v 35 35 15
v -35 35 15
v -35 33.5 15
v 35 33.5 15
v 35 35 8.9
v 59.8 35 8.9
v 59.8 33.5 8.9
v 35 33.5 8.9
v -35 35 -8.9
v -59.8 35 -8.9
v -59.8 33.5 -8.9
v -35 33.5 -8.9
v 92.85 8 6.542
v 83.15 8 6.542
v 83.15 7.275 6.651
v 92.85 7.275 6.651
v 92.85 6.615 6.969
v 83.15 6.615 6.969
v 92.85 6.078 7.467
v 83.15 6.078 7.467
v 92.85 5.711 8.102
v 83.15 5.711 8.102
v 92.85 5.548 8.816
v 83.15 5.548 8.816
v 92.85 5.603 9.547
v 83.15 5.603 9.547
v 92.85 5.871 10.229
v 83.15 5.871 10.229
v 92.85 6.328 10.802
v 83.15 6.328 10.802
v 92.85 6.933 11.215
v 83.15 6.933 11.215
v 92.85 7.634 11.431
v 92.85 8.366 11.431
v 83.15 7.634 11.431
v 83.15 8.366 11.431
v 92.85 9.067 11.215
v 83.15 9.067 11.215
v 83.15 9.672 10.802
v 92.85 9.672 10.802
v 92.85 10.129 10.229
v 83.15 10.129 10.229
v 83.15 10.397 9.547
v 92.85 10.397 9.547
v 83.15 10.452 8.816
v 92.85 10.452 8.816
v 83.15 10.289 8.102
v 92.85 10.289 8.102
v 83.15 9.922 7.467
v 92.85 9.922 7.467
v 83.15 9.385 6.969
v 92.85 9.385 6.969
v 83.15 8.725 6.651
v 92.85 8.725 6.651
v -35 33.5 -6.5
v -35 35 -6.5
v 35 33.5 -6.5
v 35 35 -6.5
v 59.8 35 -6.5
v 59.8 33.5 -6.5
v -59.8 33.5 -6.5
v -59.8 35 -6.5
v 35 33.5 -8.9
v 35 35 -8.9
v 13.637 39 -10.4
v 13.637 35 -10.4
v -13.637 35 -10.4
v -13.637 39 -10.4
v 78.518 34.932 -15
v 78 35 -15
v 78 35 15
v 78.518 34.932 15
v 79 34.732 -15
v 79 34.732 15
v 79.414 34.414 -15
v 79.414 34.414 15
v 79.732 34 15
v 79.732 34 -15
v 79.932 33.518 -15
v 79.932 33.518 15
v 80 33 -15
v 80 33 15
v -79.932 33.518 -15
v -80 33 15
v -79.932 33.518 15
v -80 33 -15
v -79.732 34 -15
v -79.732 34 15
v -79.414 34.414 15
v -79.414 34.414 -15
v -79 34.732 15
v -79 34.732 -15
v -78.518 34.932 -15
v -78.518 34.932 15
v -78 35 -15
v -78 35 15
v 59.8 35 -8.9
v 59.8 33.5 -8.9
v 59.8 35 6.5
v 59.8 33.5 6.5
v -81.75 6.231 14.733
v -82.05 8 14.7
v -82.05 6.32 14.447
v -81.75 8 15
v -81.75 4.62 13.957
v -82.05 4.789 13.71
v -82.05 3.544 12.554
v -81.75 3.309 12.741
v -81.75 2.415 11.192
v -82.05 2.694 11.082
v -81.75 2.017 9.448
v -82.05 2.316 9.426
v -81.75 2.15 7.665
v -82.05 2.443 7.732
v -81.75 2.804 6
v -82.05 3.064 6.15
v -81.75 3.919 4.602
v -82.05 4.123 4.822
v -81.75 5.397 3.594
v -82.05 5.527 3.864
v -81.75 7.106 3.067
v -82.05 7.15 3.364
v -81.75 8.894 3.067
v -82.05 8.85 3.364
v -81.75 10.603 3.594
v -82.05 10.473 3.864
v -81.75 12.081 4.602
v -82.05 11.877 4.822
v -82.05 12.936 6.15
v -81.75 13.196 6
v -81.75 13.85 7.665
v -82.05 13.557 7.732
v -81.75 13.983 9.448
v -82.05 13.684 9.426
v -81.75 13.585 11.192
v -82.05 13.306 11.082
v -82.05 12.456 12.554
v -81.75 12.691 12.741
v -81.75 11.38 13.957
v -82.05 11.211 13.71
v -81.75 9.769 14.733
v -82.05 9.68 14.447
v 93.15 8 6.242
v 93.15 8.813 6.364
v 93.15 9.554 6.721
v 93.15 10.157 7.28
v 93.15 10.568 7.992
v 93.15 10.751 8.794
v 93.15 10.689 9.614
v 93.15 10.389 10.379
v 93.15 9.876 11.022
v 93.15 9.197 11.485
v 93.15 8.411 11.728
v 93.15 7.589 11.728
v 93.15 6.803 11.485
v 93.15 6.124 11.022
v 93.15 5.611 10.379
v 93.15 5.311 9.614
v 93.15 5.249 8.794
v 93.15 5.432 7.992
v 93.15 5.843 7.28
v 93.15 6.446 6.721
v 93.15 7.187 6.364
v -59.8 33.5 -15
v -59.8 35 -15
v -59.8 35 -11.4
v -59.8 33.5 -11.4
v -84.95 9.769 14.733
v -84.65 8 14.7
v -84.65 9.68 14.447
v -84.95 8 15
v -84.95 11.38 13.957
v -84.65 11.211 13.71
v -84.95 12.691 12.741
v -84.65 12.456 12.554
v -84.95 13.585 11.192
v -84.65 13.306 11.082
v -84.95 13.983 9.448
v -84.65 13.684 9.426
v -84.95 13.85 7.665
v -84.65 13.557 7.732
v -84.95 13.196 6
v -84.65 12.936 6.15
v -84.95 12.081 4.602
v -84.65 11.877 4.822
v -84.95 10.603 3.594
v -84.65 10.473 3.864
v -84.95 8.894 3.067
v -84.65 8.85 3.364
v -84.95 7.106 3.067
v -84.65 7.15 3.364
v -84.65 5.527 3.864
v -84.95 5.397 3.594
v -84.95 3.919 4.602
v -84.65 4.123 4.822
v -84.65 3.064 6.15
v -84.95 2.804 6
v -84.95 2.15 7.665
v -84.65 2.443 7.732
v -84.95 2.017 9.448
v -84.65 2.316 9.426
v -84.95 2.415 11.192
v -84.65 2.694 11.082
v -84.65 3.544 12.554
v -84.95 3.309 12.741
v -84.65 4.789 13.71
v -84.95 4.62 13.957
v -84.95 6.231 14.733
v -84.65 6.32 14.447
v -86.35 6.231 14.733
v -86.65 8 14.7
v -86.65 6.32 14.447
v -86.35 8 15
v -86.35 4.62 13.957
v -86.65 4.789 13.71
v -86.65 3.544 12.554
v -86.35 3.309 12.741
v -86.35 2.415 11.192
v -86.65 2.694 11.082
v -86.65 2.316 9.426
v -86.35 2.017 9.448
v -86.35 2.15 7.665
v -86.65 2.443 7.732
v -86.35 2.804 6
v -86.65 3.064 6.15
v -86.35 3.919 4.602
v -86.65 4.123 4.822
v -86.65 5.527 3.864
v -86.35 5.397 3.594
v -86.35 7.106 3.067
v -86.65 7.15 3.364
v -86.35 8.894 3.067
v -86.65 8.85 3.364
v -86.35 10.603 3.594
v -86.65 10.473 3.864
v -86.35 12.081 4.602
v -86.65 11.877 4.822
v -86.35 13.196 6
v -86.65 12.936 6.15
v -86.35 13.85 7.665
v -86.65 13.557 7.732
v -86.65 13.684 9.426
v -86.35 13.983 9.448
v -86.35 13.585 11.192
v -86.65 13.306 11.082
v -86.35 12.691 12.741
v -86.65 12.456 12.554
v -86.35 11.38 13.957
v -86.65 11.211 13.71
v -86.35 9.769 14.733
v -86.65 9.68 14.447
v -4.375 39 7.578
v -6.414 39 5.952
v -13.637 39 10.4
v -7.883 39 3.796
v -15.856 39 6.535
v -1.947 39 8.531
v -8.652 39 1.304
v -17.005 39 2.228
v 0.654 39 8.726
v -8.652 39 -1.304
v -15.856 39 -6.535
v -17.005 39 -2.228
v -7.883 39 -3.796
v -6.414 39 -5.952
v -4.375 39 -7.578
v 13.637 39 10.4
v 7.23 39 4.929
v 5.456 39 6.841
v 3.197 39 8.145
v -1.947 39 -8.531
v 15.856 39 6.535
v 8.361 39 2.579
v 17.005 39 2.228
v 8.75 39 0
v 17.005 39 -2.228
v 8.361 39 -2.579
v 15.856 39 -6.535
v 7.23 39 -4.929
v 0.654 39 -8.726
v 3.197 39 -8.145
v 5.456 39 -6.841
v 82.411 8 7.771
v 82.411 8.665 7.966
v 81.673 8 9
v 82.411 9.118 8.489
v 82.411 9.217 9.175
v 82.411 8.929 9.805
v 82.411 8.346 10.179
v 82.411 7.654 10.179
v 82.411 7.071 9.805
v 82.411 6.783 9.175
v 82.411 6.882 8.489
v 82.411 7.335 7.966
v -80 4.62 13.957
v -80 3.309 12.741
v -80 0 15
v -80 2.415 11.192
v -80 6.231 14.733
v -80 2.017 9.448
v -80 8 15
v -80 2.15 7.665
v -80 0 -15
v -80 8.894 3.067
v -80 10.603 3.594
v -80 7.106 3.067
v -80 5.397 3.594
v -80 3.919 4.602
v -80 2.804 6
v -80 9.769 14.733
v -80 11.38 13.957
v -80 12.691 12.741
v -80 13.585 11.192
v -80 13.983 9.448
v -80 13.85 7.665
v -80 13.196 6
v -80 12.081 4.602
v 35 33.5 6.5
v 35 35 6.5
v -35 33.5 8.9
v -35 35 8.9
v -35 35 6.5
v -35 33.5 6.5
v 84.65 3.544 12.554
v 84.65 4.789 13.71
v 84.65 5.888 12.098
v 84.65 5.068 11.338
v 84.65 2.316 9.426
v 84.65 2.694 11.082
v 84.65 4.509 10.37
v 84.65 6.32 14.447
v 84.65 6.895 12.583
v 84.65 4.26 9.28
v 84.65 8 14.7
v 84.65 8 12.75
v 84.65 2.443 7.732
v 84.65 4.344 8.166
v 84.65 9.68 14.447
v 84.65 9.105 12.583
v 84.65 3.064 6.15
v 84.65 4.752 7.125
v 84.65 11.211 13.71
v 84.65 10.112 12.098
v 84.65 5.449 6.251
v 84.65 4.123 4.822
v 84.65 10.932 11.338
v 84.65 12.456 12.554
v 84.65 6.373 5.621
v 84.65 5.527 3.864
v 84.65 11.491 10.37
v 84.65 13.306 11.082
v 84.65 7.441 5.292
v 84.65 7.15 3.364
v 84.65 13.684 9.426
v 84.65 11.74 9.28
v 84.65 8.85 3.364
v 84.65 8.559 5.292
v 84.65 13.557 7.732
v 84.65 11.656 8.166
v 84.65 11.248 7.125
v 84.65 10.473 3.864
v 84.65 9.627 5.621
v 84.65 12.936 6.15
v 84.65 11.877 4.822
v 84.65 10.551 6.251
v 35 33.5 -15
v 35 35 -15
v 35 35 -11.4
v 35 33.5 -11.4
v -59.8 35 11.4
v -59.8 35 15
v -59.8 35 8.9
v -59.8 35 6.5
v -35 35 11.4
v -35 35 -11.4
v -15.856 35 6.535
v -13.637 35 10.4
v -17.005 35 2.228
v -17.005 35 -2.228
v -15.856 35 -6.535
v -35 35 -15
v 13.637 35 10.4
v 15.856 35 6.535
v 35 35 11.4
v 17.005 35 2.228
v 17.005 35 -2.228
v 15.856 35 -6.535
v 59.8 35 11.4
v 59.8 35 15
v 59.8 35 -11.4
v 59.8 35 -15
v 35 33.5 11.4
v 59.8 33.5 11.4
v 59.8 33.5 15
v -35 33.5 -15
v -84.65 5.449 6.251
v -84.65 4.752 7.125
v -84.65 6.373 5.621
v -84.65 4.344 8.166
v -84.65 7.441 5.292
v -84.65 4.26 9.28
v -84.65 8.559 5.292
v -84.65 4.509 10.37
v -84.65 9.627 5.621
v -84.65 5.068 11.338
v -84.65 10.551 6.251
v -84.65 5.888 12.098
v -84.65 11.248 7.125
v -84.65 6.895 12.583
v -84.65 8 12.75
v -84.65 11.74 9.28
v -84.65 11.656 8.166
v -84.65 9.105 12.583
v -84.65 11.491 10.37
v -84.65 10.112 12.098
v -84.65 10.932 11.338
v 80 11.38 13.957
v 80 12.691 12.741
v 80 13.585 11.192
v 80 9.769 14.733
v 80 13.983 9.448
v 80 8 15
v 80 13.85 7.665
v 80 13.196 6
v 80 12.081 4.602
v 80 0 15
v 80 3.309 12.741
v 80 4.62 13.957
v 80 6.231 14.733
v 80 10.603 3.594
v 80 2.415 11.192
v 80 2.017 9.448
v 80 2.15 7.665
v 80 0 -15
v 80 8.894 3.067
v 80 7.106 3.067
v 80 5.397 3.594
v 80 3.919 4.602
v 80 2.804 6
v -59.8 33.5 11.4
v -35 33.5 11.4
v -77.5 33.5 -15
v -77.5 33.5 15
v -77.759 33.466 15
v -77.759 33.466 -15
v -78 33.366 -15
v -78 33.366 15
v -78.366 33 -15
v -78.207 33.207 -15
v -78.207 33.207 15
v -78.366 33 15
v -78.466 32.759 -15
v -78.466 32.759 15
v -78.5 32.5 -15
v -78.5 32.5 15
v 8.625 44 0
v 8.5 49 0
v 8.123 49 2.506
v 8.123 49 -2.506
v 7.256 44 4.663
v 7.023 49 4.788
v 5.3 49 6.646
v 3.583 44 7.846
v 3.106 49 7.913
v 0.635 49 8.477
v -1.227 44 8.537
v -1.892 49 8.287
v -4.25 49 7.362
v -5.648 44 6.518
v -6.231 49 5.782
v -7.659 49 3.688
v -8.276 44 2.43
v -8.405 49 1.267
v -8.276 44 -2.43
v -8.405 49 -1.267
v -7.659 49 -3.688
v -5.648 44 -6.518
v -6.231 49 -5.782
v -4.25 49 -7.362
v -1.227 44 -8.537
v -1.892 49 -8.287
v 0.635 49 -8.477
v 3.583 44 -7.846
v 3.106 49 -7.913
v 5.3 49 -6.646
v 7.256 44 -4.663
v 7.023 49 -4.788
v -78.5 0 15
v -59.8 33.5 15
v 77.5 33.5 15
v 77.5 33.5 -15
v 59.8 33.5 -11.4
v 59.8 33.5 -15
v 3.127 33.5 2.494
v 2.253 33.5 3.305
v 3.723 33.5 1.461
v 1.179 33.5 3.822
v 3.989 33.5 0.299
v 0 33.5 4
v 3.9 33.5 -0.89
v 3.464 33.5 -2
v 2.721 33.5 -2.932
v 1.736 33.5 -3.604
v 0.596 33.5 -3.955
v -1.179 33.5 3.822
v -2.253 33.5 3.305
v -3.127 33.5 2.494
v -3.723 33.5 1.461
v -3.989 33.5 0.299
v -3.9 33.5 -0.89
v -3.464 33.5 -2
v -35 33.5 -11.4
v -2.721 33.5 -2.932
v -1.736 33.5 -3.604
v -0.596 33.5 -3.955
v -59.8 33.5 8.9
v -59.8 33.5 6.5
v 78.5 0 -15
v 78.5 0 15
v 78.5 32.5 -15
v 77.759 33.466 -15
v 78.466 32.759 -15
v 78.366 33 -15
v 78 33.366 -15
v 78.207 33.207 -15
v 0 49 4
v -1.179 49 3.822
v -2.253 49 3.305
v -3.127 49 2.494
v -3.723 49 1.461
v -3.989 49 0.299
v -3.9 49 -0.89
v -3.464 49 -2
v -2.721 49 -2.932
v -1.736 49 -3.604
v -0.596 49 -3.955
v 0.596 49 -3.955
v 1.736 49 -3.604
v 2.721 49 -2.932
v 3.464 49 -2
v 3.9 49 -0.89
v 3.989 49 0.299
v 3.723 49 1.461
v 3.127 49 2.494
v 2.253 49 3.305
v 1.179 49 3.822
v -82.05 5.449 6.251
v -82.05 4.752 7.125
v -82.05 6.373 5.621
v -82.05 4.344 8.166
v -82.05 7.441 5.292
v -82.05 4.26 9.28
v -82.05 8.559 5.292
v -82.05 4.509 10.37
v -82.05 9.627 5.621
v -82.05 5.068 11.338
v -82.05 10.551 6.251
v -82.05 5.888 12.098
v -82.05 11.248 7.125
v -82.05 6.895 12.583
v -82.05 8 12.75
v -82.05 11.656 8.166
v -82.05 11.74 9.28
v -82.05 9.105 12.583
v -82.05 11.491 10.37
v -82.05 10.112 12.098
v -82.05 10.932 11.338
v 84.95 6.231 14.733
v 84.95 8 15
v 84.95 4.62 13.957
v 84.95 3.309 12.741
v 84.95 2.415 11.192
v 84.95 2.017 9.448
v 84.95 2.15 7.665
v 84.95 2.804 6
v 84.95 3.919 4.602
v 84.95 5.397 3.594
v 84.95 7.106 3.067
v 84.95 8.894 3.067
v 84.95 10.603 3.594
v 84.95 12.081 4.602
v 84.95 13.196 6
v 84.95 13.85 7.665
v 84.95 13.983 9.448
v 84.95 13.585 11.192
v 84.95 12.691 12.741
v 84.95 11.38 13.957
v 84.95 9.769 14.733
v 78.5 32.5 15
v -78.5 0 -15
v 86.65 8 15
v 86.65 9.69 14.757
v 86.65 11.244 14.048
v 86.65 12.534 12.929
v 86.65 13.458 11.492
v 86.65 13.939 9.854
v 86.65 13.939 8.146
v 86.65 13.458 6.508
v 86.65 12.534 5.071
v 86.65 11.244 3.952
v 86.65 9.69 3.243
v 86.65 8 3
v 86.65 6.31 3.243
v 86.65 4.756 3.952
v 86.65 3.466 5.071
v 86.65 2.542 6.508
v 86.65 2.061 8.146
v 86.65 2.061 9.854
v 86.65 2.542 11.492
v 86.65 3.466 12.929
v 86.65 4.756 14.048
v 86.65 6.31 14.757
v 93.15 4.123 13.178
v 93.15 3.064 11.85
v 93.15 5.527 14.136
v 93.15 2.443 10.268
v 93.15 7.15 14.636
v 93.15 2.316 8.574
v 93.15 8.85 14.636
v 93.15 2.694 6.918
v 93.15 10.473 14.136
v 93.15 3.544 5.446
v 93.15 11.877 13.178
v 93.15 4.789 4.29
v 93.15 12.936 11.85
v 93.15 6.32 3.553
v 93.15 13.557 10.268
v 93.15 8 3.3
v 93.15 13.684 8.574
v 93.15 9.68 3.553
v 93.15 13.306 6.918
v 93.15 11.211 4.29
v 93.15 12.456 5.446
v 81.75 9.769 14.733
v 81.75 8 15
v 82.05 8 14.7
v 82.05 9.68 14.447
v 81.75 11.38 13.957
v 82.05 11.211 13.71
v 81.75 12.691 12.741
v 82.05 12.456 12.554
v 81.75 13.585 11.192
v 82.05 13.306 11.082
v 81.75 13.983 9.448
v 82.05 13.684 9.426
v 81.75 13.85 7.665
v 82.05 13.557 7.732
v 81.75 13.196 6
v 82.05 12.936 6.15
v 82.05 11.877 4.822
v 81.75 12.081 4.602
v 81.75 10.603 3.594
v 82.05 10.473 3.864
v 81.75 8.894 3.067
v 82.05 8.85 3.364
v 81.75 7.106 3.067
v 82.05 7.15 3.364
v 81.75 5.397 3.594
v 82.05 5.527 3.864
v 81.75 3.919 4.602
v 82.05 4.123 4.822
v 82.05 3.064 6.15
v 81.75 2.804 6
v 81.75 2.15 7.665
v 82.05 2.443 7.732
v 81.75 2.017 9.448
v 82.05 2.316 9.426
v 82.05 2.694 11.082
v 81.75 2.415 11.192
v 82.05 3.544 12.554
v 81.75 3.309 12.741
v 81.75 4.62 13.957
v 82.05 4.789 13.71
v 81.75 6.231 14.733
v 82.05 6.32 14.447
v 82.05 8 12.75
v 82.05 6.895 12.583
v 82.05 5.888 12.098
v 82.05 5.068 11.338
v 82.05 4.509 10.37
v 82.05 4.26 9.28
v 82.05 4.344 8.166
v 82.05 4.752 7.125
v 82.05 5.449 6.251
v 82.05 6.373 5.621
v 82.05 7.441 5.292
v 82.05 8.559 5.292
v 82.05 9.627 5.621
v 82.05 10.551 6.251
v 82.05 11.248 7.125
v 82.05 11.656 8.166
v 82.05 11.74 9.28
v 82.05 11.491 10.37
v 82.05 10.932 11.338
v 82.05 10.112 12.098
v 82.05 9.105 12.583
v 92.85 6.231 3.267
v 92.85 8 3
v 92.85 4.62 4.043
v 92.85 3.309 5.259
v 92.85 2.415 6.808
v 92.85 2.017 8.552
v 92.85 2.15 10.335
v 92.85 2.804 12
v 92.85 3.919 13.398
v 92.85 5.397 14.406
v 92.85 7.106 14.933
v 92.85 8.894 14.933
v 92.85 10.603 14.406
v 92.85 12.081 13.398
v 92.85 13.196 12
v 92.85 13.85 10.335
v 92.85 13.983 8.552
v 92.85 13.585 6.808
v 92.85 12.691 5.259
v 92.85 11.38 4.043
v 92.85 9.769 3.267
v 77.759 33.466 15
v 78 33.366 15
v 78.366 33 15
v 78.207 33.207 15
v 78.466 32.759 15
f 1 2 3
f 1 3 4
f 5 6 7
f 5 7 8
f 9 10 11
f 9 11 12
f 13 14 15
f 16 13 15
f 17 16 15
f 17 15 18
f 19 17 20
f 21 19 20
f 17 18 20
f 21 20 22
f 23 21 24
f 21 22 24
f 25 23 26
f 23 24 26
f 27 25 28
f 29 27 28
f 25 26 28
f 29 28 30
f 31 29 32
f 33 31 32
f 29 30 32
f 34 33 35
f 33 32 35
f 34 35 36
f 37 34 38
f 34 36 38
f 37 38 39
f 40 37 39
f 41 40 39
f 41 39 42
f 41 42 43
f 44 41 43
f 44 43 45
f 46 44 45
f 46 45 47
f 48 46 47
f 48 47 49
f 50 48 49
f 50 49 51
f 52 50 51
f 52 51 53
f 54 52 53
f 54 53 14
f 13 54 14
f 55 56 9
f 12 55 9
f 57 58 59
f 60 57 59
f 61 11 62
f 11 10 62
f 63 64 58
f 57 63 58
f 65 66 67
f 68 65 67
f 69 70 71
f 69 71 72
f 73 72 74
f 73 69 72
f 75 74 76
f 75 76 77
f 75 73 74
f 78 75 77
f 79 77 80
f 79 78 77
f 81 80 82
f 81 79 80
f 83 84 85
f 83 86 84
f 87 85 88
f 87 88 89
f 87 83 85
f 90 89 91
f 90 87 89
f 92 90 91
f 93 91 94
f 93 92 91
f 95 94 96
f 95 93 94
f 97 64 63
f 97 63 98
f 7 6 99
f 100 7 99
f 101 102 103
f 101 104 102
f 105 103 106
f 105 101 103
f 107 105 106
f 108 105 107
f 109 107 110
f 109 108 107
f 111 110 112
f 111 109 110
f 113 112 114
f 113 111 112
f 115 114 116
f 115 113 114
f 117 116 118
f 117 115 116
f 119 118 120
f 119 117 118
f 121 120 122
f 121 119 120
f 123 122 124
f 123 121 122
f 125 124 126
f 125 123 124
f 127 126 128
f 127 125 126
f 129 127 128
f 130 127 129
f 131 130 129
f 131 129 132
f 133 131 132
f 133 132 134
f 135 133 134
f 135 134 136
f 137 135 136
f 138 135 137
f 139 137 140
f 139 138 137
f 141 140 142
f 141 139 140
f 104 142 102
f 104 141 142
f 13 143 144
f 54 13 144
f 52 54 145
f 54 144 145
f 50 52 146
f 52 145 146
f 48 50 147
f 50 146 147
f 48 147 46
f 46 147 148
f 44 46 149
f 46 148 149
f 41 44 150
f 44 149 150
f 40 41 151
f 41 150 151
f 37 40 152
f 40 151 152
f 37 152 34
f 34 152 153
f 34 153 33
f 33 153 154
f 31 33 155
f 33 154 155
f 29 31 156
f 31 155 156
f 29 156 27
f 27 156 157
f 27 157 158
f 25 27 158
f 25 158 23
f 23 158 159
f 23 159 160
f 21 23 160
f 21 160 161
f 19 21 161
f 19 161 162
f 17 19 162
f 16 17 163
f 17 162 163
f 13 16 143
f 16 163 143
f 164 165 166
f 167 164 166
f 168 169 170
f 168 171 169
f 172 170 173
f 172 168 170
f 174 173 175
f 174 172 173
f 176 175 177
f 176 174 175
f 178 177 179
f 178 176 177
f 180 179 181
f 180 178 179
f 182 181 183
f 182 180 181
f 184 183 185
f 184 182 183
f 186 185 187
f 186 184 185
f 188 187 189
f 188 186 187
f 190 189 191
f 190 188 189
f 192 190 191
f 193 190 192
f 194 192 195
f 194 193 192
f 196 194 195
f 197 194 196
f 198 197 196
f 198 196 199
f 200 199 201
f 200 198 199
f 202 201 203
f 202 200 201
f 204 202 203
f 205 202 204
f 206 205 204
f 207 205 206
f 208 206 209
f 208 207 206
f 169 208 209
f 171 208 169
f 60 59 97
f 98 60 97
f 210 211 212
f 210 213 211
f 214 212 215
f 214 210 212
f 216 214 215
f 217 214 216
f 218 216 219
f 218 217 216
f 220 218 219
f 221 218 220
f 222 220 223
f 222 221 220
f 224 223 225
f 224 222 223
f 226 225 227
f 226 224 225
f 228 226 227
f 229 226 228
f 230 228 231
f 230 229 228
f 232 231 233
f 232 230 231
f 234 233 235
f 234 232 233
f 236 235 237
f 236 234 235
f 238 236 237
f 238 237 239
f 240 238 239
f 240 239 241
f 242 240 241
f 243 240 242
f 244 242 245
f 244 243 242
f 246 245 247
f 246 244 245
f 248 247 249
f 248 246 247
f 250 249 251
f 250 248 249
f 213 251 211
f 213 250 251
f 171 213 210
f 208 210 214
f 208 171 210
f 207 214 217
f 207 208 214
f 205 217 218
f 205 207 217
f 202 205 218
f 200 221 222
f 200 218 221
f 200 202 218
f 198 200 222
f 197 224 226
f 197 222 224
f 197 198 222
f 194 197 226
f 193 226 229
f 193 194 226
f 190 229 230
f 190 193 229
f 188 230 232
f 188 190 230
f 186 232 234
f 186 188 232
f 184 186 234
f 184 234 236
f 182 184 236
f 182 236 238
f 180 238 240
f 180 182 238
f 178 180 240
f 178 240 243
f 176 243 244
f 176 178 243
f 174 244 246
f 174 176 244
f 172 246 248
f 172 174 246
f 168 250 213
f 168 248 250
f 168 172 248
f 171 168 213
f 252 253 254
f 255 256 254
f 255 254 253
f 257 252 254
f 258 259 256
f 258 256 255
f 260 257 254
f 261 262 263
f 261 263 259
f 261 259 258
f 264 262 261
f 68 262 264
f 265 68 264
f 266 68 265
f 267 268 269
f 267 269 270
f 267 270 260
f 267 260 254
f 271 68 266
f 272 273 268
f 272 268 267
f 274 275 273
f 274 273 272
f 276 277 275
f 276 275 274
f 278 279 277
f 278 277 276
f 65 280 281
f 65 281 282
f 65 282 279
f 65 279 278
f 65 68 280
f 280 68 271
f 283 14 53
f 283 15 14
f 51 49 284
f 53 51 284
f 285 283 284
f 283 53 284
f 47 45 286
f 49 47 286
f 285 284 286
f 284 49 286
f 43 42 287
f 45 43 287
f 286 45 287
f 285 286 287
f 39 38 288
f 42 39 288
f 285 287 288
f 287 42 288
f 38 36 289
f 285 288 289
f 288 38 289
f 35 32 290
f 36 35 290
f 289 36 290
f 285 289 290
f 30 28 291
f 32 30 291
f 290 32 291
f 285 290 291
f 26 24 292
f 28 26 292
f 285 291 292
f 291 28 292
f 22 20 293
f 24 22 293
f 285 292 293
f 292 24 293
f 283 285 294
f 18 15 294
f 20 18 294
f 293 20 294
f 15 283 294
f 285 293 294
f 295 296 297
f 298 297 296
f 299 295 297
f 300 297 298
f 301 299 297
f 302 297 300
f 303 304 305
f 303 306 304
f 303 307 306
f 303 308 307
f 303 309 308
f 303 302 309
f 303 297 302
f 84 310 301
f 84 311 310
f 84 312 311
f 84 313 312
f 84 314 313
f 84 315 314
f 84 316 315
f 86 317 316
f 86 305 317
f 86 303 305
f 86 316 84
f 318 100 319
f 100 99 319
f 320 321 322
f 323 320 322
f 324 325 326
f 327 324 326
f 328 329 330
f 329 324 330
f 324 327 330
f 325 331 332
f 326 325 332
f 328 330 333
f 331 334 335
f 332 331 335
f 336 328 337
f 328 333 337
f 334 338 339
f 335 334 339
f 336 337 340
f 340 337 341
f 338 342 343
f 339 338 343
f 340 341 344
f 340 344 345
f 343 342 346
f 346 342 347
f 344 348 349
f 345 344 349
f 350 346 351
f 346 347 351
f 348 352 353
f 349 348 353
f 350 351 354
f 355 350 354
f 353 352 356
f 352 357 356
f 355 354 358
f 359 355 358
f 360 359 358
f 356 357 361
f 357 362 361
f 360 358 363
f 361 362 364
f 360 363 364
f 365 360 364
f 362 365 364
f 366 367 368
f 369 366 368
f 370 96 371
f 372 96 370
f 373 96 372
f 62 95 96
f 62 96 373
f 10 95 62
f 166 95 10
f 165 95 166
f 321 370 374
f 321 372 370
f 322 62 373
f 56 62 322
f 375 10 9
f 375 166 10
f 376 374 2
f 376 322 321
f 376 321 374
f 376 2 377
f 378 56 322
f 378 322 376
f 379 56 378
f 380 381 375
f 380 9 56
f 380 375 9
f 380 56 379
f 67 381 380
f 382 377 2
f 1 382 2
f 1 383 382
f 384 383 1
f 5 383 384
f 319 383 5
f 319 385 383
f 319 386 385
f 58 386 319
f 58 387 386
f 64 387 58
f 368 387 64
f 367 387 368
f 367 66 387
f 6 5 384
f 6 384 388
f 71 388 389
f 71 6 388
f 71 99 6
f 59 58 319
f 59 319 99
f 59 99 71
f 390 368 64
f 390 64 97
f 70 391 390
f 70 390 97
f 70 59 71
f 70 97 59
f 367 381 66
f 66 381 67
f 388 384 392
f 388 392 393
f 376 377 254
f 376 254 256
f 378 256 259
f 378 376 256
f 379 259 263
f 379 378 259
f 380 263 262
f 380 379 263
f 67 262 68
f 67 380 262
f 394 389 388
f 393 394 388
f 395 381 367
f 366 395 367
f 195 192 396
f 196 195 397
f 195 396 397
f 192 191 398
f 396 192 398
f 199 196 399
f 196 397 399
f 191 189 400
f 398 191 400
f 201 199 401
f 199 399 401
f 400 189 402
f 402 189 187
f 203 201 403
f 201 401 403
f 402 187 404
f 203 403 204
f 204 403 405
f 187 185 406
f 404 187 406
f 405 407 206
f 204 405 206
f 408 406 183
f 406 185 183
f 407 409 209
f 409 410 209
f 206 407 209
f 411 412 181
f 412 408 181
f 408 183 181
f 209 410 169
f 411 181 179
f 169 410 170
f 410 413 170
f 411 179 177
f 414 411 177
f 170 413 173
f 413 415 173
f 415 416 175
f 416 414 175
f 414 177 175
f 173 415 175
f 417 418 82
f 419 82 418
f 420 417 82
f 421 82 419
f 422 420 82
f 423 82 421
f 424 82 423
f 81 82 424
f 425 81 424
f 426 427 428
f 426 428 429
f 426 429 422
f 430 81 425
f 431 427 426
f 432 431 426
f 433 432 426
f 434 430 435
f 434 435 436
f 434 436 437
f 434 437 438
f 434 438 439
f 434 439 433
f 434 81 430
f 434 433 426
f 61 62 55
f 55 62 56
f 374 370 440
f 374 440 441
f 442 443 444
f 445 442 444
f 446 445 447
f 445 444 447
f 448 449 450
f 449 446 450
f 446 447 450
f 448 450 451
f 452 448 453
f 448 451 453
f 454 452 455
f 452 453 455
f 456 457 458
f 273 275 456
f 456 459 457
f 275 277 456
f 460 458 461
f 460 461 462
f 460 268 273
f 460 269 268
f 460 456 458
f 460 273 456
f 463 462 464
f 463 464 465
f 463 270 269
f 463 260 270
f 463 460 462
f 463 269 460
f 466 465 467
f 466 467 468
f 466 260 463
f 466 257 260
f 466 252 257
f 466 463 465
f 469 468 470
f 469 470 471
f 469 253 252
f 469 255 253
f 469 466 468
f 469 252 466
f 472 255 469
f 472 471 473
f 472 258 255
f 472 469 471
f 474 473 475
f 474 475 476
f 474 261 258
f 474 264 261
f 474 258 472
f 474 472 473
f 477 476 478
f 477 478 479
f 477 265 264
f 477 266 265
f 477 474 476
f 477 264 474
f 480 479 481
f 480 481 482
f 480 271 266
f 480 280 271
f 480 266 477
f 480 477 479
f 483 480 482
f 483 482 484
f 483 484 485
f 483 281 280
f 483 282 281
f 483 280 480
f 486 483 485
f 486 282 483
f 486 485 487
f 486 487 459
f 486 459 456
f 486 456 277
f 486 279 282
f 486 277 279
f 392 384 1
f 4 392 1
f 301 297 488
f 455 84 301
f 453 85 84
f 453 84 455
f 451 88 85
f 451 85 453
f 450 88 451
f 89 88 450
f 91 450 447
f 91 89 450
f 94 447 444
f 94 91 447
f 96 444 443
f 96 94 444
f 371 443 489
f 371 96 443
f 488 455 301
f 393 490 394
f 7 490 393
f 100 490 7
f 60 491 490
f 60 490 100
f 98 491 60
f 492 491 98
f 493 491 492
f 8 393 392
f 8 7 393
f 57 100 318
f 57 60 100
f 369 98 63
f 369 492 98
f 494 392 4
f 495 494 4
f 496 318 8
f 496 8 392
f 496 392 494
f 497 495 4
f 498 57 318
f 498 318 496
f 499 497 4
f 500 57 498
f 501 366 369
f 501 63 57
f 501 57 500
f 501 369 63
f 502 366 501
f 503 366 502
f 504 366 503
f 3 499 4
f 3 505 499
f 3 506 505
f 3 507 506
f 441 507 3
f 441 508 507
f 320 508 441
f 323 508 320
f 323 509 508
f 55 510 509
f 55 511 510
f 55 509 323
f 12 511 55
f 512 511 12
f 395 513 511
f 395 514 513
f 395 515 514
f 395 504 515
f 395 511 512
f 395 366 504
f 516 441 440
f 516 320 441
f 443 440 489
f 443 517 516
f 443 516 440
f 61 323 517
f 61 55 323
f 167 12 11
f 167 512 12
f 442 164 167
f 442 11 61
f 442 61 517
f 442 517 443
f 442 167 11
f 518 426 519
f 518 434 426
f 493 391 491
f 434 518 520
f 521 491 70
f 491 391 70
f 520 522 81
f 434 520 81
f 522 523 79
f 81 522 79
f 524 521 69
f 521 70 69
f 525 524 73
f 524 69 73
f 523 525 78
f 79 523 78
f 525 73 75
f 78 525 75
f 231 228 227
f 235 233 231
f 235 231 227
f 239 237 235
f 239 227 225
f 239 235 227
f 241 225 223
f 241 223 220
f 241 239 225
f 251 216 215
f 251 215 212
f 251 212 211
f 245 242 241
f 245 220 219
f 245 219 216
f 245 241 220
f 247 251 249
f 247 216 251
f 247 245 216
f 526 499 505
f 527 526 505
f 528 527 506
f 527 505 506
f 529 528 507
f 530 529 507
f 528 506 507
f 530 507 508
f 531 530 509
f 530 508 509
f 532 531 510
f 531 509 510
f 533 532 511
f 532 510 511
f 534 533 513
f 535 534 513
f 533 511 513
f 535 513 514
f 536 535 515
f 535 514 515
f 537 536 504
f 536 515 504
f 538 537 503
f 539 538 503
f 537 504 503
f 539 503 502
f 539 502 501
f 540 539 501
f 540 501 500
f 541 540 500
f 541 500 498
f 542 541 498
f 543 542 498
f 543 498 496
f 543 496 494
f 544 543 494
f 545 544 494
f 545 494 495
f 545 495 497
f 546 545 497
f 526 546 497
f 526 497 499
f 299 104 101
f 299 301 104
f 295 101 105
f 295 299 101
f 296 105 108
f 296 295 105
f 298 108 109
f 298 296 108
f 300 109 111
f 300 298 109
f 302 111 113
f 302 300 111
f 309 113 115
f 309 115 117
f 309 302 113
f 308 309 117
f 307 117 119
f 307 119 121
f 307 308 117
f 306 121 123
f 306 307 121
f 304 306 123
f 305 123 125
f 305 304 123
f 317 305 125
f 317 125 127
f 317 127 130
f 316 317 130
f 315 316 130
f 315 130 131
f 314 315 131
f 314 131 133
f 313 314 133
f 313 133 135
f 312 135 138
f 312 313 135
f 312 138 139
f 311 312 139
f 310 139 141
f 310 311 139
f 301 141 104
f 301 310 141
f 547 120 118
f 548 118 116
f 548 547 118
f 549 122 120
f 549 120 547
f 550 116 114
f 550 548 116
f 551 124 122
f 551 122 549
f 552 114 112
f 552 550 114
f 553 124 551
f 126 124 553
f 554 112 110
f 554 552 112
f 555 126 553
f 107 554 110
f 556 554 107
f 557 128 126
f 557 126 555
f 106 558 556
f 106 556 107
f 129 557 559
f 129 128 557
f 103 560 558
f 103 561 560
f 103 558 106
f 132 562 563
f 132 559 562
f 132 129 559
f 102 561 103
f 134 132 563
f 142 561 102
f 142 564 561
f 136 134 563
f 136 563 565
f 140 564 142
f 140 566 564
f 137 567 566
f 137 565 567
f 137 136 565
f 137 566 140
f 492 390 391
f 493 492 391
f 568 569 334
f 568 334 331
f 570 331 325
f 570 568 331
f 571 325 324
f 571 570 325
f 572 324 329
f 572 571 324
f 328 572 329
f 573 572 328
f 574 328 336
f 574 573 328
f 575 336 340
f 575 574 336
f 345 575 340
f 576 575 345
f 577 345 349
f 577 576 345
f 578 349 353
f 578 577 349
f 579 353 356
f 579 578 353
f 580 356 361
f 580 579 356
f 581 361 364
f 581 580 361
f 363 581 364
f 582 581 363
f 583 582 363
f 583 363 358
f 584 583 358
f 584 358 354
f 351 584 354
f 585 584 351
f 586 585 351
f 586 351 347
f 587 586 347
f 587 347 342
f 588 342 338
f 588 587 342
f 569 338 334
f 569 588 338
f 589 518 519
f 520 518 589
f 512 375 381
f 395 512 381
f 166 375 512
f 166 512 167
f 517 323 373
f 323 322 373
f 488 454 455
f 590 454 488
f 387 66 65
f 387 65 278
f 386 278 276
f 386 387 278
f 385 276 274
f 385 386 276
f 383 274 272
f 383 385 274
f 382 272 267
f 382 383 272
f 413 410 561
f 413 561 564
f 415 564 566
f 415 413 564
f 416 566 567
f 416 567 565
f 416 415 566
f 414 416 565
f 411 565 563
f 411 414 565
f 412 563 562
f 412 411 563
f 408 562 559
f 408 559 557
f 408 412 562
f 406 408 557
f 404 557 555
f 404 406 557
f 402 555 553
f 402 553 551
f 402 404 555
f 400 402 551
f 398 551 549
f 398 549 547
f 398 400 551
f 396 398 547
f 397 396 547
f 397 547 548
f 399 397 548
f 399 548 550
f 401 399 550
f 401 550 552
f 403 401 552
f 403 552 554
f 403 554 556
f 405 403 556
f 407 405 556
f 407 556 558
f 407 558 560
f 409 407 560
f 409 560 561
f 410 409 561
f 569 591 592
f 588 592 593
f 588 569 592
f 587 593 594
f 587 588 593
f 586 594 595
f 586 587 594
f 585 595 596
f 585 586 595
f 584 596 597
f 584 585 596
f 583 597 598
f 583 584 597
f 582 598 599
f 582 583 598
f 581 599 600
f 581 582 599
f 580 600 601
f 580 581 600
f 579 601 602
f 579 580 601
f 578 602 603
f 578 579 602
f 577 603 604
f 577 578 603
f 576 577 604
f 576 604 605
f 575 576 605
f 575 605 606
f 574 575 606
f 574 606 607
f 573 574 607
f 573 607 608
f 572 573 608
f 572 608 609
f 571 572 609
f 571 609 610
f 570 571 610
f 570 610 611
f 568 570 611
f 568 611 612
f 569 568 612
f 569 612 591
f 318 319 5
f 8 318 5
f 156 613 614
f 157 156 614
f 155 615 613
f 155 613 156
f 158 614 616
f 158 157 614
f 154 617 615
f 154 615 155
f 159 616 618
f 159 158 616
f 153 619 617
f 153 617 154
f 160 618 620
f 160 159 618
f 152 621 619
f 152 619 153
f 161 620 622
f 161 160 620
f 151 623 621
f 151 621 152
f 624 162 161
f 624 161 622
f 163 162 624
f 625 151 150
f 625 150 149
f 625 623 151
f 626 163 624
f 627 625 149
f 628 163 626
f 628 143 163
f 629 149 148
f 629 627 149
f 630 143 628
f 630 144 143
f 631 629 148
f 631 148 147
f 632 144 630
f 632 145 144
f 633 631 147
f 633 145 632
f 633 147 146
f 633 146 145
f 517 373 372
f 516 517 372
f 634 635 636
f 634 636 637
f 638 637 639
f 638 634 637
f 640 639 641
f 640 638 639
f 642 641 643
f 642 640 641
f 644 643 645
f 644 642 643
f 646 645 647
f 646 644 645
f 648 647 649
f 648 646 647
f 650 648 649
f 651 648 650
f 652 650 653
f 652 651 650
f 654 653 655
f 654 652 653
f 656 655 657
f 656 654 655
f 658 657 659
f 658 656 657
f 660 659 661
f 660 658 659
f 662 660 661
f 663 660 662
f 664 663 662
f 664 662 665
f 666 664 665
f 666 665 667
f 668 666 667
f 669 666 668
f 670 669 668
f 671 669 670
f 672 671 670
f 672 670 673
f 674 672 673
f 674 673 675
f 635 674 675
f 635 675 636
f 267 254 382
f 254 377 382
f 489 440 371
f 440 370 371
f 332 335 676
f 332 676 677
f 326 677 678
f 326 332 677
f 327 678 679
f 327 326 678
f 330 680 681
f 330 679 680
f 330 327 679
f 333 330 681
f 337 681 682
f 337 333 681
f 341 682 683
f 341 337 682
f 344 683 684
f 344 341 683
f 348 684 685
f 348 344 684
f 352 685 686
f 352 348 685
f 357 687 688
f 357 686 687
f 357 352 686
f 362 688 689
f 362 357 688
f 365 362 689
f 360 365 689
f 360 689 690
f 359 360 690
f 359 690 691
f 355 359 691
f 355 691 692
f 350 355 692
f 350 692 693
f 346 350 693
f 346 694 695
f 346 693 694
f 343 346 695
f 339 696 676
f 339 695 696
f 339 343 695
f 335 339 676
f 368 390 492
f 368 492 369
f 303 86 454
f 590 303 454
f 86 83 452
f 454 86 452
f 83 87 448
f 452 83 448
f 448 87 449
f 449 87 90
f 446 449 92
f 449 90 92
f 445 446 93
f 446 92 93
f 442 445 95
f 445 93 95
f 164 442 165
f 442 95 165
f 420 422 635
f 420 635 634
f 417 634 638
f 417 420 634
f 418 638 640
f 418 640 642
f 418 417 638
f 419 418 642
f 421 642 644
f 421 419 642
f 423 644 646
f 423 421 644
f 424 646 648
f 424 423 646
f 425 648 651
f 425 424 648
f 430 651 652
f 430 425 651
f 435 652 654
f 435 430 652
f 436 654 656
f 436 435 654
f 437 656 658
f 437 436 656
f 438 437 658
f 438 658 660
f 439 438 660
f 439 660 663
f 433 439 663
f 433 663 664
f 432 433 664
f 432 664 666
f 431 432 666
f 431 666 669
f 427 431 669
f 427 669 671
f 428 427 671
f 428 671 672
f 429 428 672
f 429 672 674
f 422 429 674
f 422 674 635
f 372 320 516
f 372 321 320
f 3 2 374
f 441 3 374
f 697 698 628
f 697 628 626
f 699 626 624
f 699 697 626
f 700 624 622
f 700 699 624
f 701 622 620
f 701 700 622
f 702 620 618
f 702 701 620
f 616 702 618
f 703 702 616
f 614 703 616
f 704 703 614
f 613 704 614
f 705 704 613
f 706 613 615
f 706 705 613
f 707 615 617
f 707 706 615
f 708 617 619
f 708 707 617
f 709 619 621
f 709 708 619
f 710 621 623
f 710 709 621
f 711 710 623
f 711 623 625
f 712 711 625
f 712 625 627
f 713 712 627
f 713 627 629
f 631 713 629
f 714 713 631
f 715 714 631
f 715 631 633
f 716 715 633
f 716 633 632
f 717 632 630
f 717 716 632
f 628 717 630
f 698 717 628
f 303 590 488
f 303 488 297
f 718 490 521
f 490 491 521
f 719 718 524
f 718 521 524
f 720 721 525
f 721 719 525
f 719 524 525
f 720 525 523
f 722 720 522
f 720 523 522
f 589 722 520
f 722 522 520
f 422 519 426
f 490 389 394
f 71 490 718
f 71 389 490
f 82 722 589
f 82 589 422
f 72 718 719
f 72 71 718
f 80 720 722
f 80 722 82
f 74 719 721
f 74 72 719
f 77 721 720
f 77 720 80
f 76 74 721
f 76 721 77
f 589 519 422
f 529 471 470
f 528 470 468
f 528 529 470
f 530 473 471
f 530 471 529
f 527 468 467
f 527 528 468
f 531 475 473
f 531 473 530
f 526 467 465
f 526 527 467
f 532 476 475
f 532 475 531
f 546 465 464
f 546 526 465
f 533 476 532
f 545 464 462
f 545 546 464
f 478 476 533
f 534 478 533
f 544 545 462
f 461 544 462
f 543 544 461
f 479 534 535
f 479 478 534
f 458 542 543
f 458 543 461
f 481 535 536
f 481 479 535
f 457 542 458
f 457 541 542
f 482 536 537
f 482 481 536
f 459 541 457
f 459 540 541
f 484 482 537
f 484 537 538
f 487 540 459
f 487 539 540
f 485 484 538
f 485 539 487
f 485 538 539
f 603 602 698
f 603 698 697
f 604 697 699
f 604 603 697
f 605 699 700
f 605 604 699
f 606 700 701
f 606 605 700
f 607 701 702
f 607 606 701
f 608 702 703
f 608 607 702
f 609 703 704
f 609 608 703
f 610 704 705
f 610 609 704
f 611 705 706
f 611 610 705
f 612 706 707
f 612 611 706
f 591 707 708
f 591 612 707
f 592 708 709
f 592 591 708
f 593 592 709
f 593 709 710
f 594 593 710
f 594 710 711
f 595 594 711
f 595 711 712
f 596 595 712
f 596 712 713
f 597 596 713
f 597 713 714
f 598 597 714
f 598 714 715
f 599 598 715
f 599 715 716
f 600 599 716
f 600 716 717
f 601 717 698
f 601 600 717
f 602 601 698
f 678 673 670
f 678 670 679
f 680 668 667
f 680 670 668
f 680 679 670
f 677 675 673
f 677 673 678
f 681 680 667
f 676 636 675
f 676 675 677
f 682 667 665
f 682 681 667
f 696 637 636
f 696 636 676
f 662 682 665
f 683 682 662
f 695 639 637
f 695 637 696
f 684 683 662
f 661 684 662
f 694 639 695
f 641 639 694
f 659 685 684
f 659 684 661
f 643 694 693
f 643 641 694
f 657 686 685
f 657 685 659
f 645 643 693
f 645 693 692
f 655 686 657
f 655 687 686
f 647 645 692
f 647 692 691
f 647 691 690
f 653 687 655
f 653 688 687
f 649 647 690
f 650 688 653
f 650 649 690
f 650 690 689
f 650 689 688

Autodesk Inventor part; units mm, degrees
sketch "Esquisse1" plane through (0, 0, 0) normal (0, 0, 1) x (1, 0, 0)
  line L0 (-80, 0) -> (-80, 35)
  line L1 (-80, 35) -> (80, 35)
  line L2 (80, 35) -> (80, 0)
  line L3 (80, 0) -> (78.5, 0)
  line L4 (78.5, 0) -> (78.5, 33.5)
  line L5 (78.5, 33.5) -> (-78.5, 33.5)
  line L6 (-78.5, 33.5) -> (-78.5, 0)
  line L7 (-78.5, 0) -> (-80, 0)
  point P0 (0, 0)
  point P1 (-79.25, 0)
  point P2 (0, 35)
  point P3 (0, 33.5)
  dimension "d0" = 1.5
  dimension "d1" = 1.5
  dimension "d2" = 160
  dimension "d3" = 35
extrude "Extrusion1" add sketch "Esquisse1" along normal mid plane 30
fillet "Congé1" radius 2 2 edges at (80, 35, 0) (-80, 35, 0)
fillet "Congé1" radius 1 2 edges at (-78.5, 33.5, 0) (78.5, 33.5, 0)
sketch "Esquisse2" plane through (-78, 35, 15) normal (0, 1, 0) x (1, 0, 0)
  line L0 (64.3632, 4.6) -> (91.6368, 4.6)
  line L1 (91.6368, 25.4) -> (64.3632, 25.4)
  arc A0 (64.3632, 25.4) -> (64.3632, 4.6) centre (78, 15) ccw
  arc A1 (91.6368, 4.6) -> (91.6368, 25.4) centre (78, 15) ccw
  point P0 (102.0926, 15)
  dimension "d9" = 20.8
  dimension "d10" = 17.15
  dimension "d11" = 17.15
  dimension "d12" = 10.4
extrude "Extrusion2" add sketch "Esquisse2" along normal blind 4
sketch "Esquisse3" plane through (-78, 39, 15) normal (0, 1, 0) x (1, 0, 0)
  circle A0 centre (78, 15) radius 8.75
  dimension "d15" = 17.5
extrude "Extrusion3" add sketch "Esquisse3" along normal blind 10 draft -1.43
sketch "Esquisse6" plane through (-80, 0, -15) normal (-1, 0, 0) x (0, 0, 1)
  circle A0 centre (24, 8) radius 6
  line L0 (30, 33) -> (30, 0) projected
  point P0 (15, 0)
  dimension "d20" = 12
  dimension "d21" = 8
extrude "Extrusion4" add sketch "Esquisse6" along normal blind 6.65
ref_plane "Plan de construction4" through (-84.65, 8, 9) normal (-1, 0, 0) x (0, 0, 1)
sketch "Esquisse7" plane through (-84.65, 8, 9) normal (-1, 0, 0) x (0, 0, 1)
  circle A0 centre (0, 0) radius 6 construction
  circle A1 centre (0, 0) radius 3.75
  circle A2 centre (0, 0) radius 7
  point P0 (-9, -8)
  point P1 (6, 0)
  dimension "d25" = 7.5
  dimension "d26" = 1
extrude "Extrusion5" cut sketch "Esquisse7" against normal blind 2.6
mirror "Symétrie2" about plane through (0, 0, 0) normal (1, 0, 0) of "Extrusion4", "Extrusion5"
sketch "Esquisse8" plane through (-78, 35, 15) normal (0, 1, 0) x (1, 0, 0)
  line L0 (18.2, 21.5) -> (43, 21.5)
  line L1 (43, 21.5) -> (43, 30)
  line L2 (43, 30) -> (18.2, 30)
  line L3 (18.2, 30) -> (18.2, 21.5)
  line L4 (113, 21.5) -> (137.8, 21.5)
  line L5 (137.8, 21.5) -> (137.8, 30)
  line L6 (137.8, 30) -> (113, 30)
  line L7 (113, 30) -> (113, 21.5)
  line L8 (113, 0) -> (137.8, 0)
  line L9 (137.8, 0) -> (137.8, 8.5)
  line L10 (137.8, 8.5) -> (113, 8.5)
  line L11 (113, 8.5) -> (113, 0)
  line L12 (18.2, 0) -> (43, 0)
  line L13 (43, 0) -> (43, 8.5)
  line L14 (43, 8.5) -> (18.2, 8.5)
  line L15 (18.2, 8.5) -> (18.2, 0)
  line L16 (0, 30) -> (156, 30) projected
  line L17 (156, 0) -> (0, 0) projected
  point P0 (78, 15)
  dimension "d32" = 24.8
  dimension "d33" = 24.8
  dimension "d34" = 70
  dimension "d35" = 35
  dimension "d36" = 8.5
  dimension "d37" = 8.5
extrude "Extrusion6" cut sketch "Esquisse8" against normal through all
sketch "Esquisse9" plane through (78, 35, 15) normal (0, 1, 0) x (1, 0, 0)
  line L0 (-137.8, 23.9) -> (-113, 23.9)
  line L1 (-113, 23.9) -> (-113, 26.4)
  line L2 (-113, 26.4) -> (-137.8, 26.4)
  line L3 (-137.8, 26.4) -> (-137.8, 23.9)
  line L4 (-137.8, 3.6) -> (-113, 3.6)
  line L5 (-113, 3.6) -> (-113, 6.1)
  line L6 (-113, 6.1) -> (-137.8, 6.1)
  line L7 (-137.8, 6.1) -> (-137.8, 3.6)
  line L8 (-43, 23.9) -> (-18.2, 23.9)
  line L9 (-18.2, 23.9) -> (-18.2, 26.4)
  line L10 (-18.2, 26.4) -> (-43, 26.4)
  line L11 (-43, 26.4) -> (-43, 23.9)
  line L12 (-43, 3.6) -> (-18.2, 3.6)
  line L13 (-18.2, 3.6) -> (-18.2, 6.1)
  line L14 (-18.2, 6.1) -> (-43, 6.1)
  line L15 (-43, 6.1) -> (-43, 3.6)
  line L16 (-137.8, 21.5) -> (-137.8, 30) projected
  line L17 (-113, 30) -> (-113, 21.5) projected
  line L18 (-43, 21.5) -> (-43, 30) projected
  line L19 (-18.2, 30) -> (-18.2, 21.5) projected
  line L20 (-113, 21.5) -> (-137.8, 21.5) projected
  line L21 (-137.8, 8.5) -> (-113, 8.5) projected
  point P0 (-78, 15)
  dimension "d40" = 2.5
  dimension "d41" = 2.5
  dimension "d42" = 2.4
  dimension "d43" = 2.4
extrude "Extrusion7" add sketch "Esquisse9" against normal up to surface (1.5 mm away) contours L3 L2 L1 L0 | L7 L6 L5 L4 | L11 L10 L9 L8 | L15 L14 L13 L12
sketch "Esquisse10" plane through (0, 49, 0) normal (0, 1, 0) x (1, 0, 0)
  point P0 (0, 0)
  point P1 (0, 0)
hole "Perçage1" at (0, 49, 0) direction (0, -1, 0) diameter 8 end through all
ref_plane "Plan de construction5" through (-78, 34.25, 15) normal (0, 1, 0) x (1, 0, 0)
sketch "Esquisse11" plane through (-78, 34.25, 15) normal (0, 1, 0) x (1, 0, 0)
  line L0 (18.2, 23.9) -> (43, 23.9) construction
  line L1 (43, 26.4) -> (18.2, 26.4) construction
  line L2 (18.2, 3.6) -> (43, 3.6) construction
  line L3 (43, 6.1) -> (18.2, 6.1) construction
  line L4 (-59.7354, 25.15) -> (184.2548, 25.15)
  line L5 (-24.0556, 4.85) -> (192.1599, 4.85)
  point P0 (78, 15)
  dimension "d53" = 2.5
  dimension "d54" = 2.5
  dimension "d55" = 1.25
  dimension "d56" = 1.25
ref_plane "Plan de construction6" through (86.65, 8, 9) normal (1, 0, 0) x (0, 0, -1)
sketch "Esquisse13" plane through (86.65, 8, 9) normal (1, 0, 0) x (0, 0, -1)
  circle A0 centre (0, 0) radius 6
  circle A1 centre (0, 0) radius 6 construction
  point P0 (9, -8)
extrude "Extrusion8" add sketch "Esquisse13" along normal blind 6.5
sketch "Esquisse14" plane through (93.15, 8, 9) normal (1, 0, 0) x (0, 0, -1)
  circle A0 centre (0, 0) radius 6 construction
  point P0 (9, -8)
hole "Perçage2" at (93.15, 8, 9) direction (-1, 0, 0) diameter 4.917 depth 10 tip angle 118 thread size "M6x1" class "6H" standard "ISO Metric profile"
chamfer "Chanfrein2" distance 0.3 angle 45 7 edges at (93.15, 8, 15) (93.15, 8, 11.4585) (84.65, 8, 3) (82.05, 8, 3) (-84.65, 8, 3) (-86.65, 8, 3) (-82.05, 8, 3)
equation "\"d1\" = d0"
equation "\"d11\" = d10"
equation "\"d12\" = 0.5 * d9"
equation "\"d33\" = d32"
equation "\"d35\" = 0.5 * d34"
equation "\"d37\" = d36"
equation "\"d41\" = d40"
equation "\"d43\" = d42"
equation "\"d55\" = 0.5 * d53"
equation "\"d56\" = 0.5 * d54"
equation "\"nombredor\" = 1.61803"
equation "\"pi\" = 3.141593"
properties part number "Maintient courvercle" material "Acier inoxydable"
